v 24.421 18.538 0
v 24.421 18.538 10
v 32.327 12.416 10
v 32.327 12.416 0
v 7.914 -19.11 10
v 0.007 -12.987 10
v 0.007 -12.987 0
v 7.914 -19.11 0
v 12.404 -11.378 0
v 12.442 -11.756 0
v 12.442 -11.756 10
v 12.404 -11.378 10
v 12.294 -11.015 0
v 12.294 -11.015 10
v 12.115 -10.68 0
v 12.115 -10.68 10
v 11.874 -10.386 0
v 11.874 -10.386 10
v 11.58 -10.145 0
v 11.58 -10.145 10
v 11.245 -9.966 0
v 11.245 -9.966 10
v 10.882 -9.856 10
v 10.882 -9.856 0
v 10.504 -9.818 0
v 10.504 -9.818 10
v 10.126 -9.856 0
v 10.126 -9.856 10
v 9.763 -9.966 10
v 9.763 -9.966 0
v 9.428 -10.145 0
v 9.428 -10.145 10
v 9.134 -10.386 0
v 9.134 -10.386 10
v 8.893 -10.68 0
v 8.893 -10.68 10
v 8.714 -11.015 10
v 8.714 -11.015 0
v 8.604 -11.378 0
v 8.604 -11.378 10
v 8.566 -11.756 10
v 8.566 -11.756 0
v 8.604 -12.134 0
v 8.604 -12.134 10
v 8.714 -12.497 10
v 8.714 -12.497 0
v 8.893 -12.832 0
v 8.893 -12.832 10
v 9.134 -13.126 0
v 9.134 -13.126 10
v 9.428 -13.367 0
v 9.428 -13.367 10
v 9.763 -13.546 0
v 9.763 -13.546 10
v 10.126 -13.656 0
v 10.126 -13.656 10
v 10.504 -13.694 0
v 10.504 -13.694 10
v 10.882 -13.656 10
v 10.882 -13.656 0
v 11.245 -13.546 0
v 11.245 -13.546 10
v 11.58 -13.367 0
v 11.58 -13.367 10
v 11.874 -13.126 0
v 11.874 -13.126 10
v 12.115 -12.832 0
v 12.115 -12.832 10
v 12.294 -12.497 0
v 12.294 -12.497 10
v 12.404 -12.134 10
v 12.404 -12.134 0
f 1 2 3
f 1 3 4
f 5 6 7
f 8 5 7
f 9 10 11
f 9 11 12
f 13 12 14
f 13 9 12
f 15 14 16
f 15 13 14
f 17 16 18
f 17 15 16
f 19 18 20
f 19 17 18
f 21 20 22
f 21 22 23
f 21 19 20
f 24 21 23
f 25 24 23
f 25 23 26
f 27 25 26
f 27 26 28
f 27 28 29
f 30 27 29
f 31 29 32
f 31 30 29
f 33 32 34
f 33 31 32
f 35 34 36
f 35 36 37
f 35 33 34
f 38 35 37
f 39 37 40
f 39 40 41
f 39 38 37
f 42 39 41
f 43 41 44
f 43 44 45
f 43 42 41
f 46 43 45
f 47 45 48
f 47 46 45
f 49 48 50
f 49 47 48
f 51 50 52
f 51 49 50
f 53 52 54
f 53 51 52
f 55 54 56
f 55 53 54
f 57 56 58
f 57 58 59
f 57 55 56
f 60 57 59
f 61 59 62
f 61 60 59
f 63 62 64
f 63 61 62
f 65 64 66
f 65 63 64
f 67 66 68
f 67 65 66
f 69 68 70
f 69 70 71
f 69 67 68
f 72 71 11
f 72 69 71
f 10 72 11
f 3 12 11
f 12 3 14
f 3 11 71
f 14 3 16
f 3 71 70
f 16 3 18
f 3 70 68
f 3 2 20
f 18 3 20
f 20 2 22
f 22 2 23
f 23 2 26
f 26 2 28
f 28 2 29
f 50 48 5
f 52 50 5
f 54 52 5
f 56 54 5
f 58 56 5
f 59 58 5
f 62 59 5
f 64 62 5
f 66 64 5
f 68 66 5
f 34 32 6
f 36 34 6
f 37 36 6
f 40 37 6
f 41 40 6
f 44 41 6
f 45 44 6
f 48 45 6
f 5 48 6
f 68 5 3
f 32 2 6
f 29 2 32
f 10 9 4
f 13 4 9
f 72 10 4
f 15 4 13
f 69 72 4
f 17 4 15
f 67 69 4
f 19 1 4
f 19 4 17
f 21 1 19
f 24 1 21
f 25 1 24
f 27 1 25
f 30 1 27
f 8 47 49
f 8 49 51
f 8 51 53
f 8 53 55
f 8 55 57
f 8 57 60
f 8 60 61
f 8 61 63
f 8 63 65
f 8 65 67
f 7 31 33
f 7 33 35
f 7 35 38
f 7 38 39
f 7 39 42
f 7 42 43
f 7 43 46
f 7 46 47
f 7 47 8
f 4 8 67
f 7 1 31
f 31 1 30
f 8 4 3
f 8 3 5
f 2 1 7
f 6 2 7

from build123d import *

# Parameters (mm, degrees)
CIRCLE001_R      = 1.937531
EXTRUDE011_DEPTH = 10
EXTRUDE001_W     = 39.873674
EXTRUDE001_H     = 10
EXTRUDE004_DEPTH = 10


with BuildPart() as extrude011:
    # Circle001 → Extrude011 (new body)
    with BuildSketch(Plane(origin=(10.504012, -11.75601, 0), x_dir=(1, 0, 0), z_dir=(0, 0, 1))):
        Circle(CIRCLE001_R)
    extrude(amount=EXTRUDE011_DEPTH)


with BuildPart() as cut001:
    # Extrude001 → Extrude004 (new body)
    with BuildSketch(Plane(origin=(12.214123, 2.775603, 5), x_dir=(-0.612281, -0.790641, 0), z_dir=(0.790641, -0.612281, 0))):
        Rectangle(EXTRUDE001_W, EXTRUDE001_H)
    extrude(amount=EXTRUDE004_DEPTH)

    # Cut001: cut Extrude011
    add(extrude011.part, mode=Mode.SUBTRACT)


solid = cut001.part
